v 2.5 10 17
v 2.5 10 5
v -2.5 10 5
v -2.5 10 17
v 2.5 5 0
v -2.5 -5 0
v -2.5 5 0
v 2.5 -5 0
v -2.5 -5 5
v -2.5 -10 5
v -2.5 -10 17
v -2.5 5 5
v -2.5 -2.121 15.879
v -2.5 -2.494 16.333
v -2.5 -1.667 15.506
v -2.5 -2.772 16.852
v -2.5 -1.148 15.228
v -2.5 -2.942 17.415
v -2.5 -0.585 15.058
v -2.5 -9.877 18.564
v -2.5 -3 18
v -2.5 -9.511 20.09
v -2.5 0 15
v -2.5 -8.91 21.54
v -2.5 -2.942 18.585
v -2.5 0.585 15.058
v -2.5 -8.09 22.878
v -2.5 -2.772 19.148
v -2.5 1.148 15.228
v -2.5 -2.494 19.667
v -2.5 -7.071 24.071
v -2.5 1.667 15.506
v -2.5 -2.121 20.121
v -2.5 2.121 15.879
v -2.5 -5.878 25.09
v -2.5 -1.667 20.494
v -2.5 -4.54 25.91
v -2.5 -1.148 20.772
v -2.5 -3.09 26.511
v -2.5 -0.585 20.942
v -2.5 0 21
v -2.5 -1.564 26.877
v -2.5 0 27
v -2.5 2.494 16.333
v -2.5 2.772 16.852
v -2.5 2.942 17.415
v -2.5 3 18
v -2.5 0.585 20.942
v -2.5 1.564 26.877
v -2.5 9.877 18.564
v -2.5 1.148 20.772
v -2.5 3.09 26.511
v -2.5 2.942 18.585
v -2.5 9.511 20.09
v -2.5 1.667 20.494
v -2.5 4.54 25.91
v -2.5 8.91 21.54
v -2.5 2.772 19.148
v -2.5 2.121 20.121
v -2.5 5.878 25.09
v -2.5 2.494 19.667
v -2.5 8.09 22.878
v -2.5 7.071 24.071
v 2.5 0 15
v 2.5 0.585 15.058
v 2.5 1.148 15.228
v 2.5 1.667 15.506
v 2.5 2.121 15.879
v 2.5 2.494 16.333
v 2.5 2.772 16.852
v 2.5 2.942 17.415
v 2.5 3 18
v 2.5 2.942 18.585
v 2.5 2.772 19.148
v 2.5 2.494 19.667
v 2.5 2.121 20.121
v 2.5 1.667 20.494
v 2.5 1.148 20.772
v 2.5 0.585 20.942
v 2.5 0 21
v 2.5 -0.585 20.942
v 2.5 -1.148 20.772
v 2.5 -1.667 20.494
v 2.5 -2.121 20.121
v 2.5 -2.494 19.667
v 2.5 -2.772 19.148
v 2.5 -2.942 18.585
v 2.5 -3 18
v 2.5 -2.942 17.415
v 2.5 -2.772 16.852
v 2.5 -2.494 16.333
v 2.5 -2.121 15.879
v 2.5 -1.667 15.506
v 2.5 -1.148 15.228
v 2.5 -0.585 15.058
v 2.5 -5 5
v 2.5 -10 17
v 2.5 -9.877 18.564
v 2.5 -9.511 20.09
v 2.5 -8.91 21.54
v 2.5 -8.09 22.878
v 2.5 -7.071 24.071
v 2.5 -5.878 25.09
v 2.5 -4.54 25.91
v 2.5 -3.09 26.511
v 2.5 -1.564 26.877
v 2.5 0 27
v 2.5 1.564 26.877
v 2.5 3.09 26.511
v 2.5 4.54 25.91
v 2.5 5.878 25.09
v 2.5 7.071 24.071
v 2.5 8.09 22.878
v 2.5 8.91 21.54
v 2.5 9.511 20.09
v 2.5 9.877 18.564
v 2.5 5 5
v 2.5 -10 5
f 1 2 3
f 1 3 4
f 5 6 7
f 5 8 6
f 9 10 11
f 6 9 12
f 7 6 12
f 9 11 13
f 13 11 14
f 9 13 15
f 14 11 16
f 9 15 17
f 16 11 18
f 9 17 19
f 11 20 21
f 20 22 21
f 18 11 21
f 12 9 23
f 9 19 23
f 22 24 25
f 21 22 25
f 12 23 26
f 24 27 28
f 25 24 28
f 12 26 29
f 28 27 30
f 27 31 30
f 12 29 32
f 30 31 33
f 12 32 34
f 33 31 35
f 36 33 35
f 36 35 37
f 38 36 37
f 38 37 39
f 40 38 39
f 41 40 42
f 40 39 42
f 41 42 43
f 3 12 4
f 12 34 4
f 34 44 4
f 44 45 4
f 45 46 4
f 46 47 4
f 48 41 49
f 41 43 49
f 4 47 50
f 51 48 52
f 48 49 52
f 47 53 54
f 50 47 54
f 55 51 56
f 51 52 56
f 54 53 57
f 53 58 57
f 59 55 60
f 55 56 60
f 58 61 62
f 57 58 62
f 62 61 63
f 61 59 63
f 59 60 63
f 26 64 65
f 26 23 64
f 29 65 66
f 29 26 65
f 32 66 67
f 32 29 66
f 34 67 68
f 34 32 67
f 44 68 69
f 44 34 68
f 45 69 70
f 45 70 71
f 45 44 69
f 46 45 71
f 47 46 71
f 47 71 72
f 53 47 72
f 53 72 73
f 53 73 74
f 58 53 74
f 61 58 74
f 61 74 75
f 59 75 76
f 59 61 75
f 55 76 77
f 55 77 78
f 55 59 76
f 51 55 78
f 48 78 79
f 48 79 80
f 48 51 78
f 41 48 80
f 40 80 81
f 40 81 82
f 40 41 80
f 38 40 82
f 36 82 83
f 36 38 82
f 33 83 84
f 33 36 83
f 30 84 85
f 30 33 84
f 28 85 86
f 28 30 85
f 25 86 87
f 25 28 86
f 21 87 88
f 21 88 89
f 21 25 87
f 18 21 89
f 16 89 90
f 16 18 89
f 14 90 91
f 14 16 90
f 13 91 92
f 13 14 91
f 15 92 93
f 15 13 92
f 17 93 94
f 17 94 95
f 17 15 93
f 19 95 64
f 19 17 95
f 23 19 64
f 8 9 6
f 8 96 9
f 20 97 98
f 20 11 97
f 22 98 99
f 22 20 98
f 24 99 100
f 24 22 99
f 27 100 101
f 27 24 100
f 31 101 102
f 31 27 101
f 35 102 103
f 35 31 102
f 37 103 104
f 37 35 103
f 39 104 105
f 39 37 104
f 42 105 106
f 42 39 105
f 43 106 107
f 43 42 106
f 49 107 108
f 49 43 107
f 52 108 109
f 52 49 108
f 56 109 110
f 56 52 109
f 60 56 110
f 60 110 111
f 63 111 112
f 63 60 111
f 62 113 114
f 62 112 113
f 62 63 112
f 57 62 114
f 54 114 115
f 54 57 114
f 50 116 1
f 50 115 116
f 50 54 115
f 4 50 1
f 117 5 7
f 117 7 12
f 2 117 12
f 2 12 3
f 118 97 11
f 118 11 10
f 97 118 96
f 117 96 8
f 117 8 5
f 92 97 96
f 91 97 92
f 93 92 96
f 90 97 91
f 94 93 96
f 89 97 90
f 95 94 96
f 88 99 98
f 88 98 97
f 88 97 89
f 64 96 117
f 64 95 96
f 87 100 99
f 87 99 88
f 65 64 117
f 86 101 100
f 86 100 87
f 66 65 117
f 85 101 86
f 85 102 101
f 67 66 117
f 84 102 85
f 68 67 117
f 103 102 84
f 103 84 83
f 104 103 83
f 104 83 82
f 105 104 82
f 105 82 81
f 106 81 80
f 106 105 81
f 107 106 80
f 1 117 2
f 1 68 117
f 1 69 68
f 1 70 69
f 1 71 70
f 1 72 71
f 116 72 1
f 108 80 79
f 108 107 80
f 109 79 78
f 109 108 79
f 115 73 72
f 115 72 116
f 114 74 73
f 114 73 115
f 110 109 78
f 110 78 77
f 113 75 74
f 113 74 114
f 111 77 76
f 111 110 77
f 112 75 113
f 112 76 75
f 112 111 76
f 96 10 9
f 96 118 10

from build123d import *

# Parameters (mm, degrees)
SKETCH1_R           = 3
BOSS_EXTRUDE1_DEPTH = 2.5
FILLET1_RADIUS      = 10
FILLET1_LENGTH      = 5


with BuildPart() as part:
    # Sketch1 → Boss-Extrude1 (new, symmetric)
    with BuildSketch(Plane.YZ):
        Polygon((-5, 0), (5, 0), (5, 5), (10, 5), (10, 27), (-10, 27), (-10, 5), (-5, 5), align=None)
        with Locations(Location((0, 18, 0), (0, 0, 270))):
            Circle(SKETCH1_R, mode=Mode.SUBTRACT)
    extrude(amount=BOSS_EXTRUDE1_DEPTH, both=True)

    # Fillet1: full round fillet: the end face becomes a half cylinder, R = half its width
    fillet1_face = Plane((0, 0, 27), x_dir=(-1, 0, 0), z_dir=(0, 0, 1))  # on the end face: x along it, z out of the body
    fillet1_slab = fillet1_face.offset(-FILLET1_RADIUS / 2) * Box(FILLET1_LENGTH, 2 * FILLET1_RADIUS, FILLET1_RADIUS, mode=Mode.PRIVATE)  # the body's end, R deep
    fillet1_round = Plane((0, 0, 17), x_dir=(0, 0, 1), z_dir=(-1, 0, 0)) * Cylinder(FILLET1_RADIUS, FILLET1_LENGTH, mode=Mode.PRIVATE)  # its axis R under the face
    add(fillet1_slab - fillet1_round, mode=Mode.SUBTRACT)


solid = part.part
